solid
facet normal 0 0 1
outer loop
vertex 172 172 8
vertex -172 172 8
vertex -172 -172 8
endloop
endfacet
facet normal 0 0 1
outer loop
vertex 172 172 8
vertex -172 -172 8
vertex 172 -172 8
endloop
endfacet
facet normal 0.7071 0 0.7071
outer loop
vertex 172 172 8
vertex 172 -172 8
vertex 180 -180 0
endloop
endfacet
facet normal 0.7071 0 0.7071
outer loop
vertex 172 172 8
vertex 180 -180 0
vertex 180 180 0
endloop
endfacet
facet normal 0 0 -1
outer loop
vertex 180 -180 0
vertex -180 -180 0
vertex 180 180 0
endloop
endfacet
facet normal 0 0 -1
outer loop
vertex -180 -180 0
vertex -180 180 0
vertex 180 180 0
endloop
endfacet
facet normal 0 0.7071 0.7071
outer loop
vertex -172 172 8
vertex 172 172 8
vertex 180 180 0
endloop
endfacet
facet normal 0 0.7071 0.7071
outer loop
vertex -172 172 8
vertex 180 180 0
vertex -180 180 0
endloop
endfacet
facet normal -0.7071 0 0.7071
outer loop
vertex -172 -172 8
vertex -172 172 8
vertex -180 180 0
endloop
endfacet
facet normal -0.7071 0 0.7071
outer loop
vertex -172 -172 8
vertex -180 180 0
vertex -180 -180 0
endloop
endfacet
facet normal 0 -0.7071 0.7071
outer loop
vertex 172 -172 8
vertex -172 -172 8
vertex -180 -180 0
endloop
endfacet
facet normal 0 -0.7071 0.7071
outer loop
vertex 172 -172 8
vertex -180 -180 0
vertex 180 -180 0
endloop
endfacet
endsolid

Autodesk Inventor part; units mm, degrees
ref_plane "YZ Plane" through (0, 0, 0) normal (1, 0, 0) x (0, 1, 0)
ref_plane "XZ Plane" through (0, 0, 0) normal (0, 1, 0) x (-1, 0, 0)
ref_plane "XY Plane" through (0, 0, 0) normal (0, 0, 1) x (1, 0, 0)
sketch "Sketch1" plane through (0, 0, 0) normal (0, 0, 1) x (1, 0, 0)
  line L0 (-180, 180) -> (180, 180)
  line L1 (180, 180) -> (180, -180)
  line L2 (180, -180) -> (-180, -180)
  line L3 (-180, -180) -> (-180, 180)
  point P0 (0, 0)
  dimension "d0" = 360
  dimension "d1" = 360
  dimension "d2" = 180
  dimension "d3" = 180
extrude "Extrusion1" add sketch "Sketch1" along normal blind 8
chamfer "Chamfer1" distance 8 angle 45 4 edges at (-180, 0, 8) (0, -180, 8) (180, 0, 8) (0, 180, 8)
equation "\"d0\" = edge_length"
equation "\"d1\" = edge_length"
equation "\"d2\" = 0.5 * edge_length"
equation "\"d3\" = 0.5 * edge_length"
equation "\"d4\" = wall_width"
equation "\"d6\" = wall_width"
equation "\"edge_length\" = 360"
equation "\"wall_width\" = 8"
properties part number "Element"
